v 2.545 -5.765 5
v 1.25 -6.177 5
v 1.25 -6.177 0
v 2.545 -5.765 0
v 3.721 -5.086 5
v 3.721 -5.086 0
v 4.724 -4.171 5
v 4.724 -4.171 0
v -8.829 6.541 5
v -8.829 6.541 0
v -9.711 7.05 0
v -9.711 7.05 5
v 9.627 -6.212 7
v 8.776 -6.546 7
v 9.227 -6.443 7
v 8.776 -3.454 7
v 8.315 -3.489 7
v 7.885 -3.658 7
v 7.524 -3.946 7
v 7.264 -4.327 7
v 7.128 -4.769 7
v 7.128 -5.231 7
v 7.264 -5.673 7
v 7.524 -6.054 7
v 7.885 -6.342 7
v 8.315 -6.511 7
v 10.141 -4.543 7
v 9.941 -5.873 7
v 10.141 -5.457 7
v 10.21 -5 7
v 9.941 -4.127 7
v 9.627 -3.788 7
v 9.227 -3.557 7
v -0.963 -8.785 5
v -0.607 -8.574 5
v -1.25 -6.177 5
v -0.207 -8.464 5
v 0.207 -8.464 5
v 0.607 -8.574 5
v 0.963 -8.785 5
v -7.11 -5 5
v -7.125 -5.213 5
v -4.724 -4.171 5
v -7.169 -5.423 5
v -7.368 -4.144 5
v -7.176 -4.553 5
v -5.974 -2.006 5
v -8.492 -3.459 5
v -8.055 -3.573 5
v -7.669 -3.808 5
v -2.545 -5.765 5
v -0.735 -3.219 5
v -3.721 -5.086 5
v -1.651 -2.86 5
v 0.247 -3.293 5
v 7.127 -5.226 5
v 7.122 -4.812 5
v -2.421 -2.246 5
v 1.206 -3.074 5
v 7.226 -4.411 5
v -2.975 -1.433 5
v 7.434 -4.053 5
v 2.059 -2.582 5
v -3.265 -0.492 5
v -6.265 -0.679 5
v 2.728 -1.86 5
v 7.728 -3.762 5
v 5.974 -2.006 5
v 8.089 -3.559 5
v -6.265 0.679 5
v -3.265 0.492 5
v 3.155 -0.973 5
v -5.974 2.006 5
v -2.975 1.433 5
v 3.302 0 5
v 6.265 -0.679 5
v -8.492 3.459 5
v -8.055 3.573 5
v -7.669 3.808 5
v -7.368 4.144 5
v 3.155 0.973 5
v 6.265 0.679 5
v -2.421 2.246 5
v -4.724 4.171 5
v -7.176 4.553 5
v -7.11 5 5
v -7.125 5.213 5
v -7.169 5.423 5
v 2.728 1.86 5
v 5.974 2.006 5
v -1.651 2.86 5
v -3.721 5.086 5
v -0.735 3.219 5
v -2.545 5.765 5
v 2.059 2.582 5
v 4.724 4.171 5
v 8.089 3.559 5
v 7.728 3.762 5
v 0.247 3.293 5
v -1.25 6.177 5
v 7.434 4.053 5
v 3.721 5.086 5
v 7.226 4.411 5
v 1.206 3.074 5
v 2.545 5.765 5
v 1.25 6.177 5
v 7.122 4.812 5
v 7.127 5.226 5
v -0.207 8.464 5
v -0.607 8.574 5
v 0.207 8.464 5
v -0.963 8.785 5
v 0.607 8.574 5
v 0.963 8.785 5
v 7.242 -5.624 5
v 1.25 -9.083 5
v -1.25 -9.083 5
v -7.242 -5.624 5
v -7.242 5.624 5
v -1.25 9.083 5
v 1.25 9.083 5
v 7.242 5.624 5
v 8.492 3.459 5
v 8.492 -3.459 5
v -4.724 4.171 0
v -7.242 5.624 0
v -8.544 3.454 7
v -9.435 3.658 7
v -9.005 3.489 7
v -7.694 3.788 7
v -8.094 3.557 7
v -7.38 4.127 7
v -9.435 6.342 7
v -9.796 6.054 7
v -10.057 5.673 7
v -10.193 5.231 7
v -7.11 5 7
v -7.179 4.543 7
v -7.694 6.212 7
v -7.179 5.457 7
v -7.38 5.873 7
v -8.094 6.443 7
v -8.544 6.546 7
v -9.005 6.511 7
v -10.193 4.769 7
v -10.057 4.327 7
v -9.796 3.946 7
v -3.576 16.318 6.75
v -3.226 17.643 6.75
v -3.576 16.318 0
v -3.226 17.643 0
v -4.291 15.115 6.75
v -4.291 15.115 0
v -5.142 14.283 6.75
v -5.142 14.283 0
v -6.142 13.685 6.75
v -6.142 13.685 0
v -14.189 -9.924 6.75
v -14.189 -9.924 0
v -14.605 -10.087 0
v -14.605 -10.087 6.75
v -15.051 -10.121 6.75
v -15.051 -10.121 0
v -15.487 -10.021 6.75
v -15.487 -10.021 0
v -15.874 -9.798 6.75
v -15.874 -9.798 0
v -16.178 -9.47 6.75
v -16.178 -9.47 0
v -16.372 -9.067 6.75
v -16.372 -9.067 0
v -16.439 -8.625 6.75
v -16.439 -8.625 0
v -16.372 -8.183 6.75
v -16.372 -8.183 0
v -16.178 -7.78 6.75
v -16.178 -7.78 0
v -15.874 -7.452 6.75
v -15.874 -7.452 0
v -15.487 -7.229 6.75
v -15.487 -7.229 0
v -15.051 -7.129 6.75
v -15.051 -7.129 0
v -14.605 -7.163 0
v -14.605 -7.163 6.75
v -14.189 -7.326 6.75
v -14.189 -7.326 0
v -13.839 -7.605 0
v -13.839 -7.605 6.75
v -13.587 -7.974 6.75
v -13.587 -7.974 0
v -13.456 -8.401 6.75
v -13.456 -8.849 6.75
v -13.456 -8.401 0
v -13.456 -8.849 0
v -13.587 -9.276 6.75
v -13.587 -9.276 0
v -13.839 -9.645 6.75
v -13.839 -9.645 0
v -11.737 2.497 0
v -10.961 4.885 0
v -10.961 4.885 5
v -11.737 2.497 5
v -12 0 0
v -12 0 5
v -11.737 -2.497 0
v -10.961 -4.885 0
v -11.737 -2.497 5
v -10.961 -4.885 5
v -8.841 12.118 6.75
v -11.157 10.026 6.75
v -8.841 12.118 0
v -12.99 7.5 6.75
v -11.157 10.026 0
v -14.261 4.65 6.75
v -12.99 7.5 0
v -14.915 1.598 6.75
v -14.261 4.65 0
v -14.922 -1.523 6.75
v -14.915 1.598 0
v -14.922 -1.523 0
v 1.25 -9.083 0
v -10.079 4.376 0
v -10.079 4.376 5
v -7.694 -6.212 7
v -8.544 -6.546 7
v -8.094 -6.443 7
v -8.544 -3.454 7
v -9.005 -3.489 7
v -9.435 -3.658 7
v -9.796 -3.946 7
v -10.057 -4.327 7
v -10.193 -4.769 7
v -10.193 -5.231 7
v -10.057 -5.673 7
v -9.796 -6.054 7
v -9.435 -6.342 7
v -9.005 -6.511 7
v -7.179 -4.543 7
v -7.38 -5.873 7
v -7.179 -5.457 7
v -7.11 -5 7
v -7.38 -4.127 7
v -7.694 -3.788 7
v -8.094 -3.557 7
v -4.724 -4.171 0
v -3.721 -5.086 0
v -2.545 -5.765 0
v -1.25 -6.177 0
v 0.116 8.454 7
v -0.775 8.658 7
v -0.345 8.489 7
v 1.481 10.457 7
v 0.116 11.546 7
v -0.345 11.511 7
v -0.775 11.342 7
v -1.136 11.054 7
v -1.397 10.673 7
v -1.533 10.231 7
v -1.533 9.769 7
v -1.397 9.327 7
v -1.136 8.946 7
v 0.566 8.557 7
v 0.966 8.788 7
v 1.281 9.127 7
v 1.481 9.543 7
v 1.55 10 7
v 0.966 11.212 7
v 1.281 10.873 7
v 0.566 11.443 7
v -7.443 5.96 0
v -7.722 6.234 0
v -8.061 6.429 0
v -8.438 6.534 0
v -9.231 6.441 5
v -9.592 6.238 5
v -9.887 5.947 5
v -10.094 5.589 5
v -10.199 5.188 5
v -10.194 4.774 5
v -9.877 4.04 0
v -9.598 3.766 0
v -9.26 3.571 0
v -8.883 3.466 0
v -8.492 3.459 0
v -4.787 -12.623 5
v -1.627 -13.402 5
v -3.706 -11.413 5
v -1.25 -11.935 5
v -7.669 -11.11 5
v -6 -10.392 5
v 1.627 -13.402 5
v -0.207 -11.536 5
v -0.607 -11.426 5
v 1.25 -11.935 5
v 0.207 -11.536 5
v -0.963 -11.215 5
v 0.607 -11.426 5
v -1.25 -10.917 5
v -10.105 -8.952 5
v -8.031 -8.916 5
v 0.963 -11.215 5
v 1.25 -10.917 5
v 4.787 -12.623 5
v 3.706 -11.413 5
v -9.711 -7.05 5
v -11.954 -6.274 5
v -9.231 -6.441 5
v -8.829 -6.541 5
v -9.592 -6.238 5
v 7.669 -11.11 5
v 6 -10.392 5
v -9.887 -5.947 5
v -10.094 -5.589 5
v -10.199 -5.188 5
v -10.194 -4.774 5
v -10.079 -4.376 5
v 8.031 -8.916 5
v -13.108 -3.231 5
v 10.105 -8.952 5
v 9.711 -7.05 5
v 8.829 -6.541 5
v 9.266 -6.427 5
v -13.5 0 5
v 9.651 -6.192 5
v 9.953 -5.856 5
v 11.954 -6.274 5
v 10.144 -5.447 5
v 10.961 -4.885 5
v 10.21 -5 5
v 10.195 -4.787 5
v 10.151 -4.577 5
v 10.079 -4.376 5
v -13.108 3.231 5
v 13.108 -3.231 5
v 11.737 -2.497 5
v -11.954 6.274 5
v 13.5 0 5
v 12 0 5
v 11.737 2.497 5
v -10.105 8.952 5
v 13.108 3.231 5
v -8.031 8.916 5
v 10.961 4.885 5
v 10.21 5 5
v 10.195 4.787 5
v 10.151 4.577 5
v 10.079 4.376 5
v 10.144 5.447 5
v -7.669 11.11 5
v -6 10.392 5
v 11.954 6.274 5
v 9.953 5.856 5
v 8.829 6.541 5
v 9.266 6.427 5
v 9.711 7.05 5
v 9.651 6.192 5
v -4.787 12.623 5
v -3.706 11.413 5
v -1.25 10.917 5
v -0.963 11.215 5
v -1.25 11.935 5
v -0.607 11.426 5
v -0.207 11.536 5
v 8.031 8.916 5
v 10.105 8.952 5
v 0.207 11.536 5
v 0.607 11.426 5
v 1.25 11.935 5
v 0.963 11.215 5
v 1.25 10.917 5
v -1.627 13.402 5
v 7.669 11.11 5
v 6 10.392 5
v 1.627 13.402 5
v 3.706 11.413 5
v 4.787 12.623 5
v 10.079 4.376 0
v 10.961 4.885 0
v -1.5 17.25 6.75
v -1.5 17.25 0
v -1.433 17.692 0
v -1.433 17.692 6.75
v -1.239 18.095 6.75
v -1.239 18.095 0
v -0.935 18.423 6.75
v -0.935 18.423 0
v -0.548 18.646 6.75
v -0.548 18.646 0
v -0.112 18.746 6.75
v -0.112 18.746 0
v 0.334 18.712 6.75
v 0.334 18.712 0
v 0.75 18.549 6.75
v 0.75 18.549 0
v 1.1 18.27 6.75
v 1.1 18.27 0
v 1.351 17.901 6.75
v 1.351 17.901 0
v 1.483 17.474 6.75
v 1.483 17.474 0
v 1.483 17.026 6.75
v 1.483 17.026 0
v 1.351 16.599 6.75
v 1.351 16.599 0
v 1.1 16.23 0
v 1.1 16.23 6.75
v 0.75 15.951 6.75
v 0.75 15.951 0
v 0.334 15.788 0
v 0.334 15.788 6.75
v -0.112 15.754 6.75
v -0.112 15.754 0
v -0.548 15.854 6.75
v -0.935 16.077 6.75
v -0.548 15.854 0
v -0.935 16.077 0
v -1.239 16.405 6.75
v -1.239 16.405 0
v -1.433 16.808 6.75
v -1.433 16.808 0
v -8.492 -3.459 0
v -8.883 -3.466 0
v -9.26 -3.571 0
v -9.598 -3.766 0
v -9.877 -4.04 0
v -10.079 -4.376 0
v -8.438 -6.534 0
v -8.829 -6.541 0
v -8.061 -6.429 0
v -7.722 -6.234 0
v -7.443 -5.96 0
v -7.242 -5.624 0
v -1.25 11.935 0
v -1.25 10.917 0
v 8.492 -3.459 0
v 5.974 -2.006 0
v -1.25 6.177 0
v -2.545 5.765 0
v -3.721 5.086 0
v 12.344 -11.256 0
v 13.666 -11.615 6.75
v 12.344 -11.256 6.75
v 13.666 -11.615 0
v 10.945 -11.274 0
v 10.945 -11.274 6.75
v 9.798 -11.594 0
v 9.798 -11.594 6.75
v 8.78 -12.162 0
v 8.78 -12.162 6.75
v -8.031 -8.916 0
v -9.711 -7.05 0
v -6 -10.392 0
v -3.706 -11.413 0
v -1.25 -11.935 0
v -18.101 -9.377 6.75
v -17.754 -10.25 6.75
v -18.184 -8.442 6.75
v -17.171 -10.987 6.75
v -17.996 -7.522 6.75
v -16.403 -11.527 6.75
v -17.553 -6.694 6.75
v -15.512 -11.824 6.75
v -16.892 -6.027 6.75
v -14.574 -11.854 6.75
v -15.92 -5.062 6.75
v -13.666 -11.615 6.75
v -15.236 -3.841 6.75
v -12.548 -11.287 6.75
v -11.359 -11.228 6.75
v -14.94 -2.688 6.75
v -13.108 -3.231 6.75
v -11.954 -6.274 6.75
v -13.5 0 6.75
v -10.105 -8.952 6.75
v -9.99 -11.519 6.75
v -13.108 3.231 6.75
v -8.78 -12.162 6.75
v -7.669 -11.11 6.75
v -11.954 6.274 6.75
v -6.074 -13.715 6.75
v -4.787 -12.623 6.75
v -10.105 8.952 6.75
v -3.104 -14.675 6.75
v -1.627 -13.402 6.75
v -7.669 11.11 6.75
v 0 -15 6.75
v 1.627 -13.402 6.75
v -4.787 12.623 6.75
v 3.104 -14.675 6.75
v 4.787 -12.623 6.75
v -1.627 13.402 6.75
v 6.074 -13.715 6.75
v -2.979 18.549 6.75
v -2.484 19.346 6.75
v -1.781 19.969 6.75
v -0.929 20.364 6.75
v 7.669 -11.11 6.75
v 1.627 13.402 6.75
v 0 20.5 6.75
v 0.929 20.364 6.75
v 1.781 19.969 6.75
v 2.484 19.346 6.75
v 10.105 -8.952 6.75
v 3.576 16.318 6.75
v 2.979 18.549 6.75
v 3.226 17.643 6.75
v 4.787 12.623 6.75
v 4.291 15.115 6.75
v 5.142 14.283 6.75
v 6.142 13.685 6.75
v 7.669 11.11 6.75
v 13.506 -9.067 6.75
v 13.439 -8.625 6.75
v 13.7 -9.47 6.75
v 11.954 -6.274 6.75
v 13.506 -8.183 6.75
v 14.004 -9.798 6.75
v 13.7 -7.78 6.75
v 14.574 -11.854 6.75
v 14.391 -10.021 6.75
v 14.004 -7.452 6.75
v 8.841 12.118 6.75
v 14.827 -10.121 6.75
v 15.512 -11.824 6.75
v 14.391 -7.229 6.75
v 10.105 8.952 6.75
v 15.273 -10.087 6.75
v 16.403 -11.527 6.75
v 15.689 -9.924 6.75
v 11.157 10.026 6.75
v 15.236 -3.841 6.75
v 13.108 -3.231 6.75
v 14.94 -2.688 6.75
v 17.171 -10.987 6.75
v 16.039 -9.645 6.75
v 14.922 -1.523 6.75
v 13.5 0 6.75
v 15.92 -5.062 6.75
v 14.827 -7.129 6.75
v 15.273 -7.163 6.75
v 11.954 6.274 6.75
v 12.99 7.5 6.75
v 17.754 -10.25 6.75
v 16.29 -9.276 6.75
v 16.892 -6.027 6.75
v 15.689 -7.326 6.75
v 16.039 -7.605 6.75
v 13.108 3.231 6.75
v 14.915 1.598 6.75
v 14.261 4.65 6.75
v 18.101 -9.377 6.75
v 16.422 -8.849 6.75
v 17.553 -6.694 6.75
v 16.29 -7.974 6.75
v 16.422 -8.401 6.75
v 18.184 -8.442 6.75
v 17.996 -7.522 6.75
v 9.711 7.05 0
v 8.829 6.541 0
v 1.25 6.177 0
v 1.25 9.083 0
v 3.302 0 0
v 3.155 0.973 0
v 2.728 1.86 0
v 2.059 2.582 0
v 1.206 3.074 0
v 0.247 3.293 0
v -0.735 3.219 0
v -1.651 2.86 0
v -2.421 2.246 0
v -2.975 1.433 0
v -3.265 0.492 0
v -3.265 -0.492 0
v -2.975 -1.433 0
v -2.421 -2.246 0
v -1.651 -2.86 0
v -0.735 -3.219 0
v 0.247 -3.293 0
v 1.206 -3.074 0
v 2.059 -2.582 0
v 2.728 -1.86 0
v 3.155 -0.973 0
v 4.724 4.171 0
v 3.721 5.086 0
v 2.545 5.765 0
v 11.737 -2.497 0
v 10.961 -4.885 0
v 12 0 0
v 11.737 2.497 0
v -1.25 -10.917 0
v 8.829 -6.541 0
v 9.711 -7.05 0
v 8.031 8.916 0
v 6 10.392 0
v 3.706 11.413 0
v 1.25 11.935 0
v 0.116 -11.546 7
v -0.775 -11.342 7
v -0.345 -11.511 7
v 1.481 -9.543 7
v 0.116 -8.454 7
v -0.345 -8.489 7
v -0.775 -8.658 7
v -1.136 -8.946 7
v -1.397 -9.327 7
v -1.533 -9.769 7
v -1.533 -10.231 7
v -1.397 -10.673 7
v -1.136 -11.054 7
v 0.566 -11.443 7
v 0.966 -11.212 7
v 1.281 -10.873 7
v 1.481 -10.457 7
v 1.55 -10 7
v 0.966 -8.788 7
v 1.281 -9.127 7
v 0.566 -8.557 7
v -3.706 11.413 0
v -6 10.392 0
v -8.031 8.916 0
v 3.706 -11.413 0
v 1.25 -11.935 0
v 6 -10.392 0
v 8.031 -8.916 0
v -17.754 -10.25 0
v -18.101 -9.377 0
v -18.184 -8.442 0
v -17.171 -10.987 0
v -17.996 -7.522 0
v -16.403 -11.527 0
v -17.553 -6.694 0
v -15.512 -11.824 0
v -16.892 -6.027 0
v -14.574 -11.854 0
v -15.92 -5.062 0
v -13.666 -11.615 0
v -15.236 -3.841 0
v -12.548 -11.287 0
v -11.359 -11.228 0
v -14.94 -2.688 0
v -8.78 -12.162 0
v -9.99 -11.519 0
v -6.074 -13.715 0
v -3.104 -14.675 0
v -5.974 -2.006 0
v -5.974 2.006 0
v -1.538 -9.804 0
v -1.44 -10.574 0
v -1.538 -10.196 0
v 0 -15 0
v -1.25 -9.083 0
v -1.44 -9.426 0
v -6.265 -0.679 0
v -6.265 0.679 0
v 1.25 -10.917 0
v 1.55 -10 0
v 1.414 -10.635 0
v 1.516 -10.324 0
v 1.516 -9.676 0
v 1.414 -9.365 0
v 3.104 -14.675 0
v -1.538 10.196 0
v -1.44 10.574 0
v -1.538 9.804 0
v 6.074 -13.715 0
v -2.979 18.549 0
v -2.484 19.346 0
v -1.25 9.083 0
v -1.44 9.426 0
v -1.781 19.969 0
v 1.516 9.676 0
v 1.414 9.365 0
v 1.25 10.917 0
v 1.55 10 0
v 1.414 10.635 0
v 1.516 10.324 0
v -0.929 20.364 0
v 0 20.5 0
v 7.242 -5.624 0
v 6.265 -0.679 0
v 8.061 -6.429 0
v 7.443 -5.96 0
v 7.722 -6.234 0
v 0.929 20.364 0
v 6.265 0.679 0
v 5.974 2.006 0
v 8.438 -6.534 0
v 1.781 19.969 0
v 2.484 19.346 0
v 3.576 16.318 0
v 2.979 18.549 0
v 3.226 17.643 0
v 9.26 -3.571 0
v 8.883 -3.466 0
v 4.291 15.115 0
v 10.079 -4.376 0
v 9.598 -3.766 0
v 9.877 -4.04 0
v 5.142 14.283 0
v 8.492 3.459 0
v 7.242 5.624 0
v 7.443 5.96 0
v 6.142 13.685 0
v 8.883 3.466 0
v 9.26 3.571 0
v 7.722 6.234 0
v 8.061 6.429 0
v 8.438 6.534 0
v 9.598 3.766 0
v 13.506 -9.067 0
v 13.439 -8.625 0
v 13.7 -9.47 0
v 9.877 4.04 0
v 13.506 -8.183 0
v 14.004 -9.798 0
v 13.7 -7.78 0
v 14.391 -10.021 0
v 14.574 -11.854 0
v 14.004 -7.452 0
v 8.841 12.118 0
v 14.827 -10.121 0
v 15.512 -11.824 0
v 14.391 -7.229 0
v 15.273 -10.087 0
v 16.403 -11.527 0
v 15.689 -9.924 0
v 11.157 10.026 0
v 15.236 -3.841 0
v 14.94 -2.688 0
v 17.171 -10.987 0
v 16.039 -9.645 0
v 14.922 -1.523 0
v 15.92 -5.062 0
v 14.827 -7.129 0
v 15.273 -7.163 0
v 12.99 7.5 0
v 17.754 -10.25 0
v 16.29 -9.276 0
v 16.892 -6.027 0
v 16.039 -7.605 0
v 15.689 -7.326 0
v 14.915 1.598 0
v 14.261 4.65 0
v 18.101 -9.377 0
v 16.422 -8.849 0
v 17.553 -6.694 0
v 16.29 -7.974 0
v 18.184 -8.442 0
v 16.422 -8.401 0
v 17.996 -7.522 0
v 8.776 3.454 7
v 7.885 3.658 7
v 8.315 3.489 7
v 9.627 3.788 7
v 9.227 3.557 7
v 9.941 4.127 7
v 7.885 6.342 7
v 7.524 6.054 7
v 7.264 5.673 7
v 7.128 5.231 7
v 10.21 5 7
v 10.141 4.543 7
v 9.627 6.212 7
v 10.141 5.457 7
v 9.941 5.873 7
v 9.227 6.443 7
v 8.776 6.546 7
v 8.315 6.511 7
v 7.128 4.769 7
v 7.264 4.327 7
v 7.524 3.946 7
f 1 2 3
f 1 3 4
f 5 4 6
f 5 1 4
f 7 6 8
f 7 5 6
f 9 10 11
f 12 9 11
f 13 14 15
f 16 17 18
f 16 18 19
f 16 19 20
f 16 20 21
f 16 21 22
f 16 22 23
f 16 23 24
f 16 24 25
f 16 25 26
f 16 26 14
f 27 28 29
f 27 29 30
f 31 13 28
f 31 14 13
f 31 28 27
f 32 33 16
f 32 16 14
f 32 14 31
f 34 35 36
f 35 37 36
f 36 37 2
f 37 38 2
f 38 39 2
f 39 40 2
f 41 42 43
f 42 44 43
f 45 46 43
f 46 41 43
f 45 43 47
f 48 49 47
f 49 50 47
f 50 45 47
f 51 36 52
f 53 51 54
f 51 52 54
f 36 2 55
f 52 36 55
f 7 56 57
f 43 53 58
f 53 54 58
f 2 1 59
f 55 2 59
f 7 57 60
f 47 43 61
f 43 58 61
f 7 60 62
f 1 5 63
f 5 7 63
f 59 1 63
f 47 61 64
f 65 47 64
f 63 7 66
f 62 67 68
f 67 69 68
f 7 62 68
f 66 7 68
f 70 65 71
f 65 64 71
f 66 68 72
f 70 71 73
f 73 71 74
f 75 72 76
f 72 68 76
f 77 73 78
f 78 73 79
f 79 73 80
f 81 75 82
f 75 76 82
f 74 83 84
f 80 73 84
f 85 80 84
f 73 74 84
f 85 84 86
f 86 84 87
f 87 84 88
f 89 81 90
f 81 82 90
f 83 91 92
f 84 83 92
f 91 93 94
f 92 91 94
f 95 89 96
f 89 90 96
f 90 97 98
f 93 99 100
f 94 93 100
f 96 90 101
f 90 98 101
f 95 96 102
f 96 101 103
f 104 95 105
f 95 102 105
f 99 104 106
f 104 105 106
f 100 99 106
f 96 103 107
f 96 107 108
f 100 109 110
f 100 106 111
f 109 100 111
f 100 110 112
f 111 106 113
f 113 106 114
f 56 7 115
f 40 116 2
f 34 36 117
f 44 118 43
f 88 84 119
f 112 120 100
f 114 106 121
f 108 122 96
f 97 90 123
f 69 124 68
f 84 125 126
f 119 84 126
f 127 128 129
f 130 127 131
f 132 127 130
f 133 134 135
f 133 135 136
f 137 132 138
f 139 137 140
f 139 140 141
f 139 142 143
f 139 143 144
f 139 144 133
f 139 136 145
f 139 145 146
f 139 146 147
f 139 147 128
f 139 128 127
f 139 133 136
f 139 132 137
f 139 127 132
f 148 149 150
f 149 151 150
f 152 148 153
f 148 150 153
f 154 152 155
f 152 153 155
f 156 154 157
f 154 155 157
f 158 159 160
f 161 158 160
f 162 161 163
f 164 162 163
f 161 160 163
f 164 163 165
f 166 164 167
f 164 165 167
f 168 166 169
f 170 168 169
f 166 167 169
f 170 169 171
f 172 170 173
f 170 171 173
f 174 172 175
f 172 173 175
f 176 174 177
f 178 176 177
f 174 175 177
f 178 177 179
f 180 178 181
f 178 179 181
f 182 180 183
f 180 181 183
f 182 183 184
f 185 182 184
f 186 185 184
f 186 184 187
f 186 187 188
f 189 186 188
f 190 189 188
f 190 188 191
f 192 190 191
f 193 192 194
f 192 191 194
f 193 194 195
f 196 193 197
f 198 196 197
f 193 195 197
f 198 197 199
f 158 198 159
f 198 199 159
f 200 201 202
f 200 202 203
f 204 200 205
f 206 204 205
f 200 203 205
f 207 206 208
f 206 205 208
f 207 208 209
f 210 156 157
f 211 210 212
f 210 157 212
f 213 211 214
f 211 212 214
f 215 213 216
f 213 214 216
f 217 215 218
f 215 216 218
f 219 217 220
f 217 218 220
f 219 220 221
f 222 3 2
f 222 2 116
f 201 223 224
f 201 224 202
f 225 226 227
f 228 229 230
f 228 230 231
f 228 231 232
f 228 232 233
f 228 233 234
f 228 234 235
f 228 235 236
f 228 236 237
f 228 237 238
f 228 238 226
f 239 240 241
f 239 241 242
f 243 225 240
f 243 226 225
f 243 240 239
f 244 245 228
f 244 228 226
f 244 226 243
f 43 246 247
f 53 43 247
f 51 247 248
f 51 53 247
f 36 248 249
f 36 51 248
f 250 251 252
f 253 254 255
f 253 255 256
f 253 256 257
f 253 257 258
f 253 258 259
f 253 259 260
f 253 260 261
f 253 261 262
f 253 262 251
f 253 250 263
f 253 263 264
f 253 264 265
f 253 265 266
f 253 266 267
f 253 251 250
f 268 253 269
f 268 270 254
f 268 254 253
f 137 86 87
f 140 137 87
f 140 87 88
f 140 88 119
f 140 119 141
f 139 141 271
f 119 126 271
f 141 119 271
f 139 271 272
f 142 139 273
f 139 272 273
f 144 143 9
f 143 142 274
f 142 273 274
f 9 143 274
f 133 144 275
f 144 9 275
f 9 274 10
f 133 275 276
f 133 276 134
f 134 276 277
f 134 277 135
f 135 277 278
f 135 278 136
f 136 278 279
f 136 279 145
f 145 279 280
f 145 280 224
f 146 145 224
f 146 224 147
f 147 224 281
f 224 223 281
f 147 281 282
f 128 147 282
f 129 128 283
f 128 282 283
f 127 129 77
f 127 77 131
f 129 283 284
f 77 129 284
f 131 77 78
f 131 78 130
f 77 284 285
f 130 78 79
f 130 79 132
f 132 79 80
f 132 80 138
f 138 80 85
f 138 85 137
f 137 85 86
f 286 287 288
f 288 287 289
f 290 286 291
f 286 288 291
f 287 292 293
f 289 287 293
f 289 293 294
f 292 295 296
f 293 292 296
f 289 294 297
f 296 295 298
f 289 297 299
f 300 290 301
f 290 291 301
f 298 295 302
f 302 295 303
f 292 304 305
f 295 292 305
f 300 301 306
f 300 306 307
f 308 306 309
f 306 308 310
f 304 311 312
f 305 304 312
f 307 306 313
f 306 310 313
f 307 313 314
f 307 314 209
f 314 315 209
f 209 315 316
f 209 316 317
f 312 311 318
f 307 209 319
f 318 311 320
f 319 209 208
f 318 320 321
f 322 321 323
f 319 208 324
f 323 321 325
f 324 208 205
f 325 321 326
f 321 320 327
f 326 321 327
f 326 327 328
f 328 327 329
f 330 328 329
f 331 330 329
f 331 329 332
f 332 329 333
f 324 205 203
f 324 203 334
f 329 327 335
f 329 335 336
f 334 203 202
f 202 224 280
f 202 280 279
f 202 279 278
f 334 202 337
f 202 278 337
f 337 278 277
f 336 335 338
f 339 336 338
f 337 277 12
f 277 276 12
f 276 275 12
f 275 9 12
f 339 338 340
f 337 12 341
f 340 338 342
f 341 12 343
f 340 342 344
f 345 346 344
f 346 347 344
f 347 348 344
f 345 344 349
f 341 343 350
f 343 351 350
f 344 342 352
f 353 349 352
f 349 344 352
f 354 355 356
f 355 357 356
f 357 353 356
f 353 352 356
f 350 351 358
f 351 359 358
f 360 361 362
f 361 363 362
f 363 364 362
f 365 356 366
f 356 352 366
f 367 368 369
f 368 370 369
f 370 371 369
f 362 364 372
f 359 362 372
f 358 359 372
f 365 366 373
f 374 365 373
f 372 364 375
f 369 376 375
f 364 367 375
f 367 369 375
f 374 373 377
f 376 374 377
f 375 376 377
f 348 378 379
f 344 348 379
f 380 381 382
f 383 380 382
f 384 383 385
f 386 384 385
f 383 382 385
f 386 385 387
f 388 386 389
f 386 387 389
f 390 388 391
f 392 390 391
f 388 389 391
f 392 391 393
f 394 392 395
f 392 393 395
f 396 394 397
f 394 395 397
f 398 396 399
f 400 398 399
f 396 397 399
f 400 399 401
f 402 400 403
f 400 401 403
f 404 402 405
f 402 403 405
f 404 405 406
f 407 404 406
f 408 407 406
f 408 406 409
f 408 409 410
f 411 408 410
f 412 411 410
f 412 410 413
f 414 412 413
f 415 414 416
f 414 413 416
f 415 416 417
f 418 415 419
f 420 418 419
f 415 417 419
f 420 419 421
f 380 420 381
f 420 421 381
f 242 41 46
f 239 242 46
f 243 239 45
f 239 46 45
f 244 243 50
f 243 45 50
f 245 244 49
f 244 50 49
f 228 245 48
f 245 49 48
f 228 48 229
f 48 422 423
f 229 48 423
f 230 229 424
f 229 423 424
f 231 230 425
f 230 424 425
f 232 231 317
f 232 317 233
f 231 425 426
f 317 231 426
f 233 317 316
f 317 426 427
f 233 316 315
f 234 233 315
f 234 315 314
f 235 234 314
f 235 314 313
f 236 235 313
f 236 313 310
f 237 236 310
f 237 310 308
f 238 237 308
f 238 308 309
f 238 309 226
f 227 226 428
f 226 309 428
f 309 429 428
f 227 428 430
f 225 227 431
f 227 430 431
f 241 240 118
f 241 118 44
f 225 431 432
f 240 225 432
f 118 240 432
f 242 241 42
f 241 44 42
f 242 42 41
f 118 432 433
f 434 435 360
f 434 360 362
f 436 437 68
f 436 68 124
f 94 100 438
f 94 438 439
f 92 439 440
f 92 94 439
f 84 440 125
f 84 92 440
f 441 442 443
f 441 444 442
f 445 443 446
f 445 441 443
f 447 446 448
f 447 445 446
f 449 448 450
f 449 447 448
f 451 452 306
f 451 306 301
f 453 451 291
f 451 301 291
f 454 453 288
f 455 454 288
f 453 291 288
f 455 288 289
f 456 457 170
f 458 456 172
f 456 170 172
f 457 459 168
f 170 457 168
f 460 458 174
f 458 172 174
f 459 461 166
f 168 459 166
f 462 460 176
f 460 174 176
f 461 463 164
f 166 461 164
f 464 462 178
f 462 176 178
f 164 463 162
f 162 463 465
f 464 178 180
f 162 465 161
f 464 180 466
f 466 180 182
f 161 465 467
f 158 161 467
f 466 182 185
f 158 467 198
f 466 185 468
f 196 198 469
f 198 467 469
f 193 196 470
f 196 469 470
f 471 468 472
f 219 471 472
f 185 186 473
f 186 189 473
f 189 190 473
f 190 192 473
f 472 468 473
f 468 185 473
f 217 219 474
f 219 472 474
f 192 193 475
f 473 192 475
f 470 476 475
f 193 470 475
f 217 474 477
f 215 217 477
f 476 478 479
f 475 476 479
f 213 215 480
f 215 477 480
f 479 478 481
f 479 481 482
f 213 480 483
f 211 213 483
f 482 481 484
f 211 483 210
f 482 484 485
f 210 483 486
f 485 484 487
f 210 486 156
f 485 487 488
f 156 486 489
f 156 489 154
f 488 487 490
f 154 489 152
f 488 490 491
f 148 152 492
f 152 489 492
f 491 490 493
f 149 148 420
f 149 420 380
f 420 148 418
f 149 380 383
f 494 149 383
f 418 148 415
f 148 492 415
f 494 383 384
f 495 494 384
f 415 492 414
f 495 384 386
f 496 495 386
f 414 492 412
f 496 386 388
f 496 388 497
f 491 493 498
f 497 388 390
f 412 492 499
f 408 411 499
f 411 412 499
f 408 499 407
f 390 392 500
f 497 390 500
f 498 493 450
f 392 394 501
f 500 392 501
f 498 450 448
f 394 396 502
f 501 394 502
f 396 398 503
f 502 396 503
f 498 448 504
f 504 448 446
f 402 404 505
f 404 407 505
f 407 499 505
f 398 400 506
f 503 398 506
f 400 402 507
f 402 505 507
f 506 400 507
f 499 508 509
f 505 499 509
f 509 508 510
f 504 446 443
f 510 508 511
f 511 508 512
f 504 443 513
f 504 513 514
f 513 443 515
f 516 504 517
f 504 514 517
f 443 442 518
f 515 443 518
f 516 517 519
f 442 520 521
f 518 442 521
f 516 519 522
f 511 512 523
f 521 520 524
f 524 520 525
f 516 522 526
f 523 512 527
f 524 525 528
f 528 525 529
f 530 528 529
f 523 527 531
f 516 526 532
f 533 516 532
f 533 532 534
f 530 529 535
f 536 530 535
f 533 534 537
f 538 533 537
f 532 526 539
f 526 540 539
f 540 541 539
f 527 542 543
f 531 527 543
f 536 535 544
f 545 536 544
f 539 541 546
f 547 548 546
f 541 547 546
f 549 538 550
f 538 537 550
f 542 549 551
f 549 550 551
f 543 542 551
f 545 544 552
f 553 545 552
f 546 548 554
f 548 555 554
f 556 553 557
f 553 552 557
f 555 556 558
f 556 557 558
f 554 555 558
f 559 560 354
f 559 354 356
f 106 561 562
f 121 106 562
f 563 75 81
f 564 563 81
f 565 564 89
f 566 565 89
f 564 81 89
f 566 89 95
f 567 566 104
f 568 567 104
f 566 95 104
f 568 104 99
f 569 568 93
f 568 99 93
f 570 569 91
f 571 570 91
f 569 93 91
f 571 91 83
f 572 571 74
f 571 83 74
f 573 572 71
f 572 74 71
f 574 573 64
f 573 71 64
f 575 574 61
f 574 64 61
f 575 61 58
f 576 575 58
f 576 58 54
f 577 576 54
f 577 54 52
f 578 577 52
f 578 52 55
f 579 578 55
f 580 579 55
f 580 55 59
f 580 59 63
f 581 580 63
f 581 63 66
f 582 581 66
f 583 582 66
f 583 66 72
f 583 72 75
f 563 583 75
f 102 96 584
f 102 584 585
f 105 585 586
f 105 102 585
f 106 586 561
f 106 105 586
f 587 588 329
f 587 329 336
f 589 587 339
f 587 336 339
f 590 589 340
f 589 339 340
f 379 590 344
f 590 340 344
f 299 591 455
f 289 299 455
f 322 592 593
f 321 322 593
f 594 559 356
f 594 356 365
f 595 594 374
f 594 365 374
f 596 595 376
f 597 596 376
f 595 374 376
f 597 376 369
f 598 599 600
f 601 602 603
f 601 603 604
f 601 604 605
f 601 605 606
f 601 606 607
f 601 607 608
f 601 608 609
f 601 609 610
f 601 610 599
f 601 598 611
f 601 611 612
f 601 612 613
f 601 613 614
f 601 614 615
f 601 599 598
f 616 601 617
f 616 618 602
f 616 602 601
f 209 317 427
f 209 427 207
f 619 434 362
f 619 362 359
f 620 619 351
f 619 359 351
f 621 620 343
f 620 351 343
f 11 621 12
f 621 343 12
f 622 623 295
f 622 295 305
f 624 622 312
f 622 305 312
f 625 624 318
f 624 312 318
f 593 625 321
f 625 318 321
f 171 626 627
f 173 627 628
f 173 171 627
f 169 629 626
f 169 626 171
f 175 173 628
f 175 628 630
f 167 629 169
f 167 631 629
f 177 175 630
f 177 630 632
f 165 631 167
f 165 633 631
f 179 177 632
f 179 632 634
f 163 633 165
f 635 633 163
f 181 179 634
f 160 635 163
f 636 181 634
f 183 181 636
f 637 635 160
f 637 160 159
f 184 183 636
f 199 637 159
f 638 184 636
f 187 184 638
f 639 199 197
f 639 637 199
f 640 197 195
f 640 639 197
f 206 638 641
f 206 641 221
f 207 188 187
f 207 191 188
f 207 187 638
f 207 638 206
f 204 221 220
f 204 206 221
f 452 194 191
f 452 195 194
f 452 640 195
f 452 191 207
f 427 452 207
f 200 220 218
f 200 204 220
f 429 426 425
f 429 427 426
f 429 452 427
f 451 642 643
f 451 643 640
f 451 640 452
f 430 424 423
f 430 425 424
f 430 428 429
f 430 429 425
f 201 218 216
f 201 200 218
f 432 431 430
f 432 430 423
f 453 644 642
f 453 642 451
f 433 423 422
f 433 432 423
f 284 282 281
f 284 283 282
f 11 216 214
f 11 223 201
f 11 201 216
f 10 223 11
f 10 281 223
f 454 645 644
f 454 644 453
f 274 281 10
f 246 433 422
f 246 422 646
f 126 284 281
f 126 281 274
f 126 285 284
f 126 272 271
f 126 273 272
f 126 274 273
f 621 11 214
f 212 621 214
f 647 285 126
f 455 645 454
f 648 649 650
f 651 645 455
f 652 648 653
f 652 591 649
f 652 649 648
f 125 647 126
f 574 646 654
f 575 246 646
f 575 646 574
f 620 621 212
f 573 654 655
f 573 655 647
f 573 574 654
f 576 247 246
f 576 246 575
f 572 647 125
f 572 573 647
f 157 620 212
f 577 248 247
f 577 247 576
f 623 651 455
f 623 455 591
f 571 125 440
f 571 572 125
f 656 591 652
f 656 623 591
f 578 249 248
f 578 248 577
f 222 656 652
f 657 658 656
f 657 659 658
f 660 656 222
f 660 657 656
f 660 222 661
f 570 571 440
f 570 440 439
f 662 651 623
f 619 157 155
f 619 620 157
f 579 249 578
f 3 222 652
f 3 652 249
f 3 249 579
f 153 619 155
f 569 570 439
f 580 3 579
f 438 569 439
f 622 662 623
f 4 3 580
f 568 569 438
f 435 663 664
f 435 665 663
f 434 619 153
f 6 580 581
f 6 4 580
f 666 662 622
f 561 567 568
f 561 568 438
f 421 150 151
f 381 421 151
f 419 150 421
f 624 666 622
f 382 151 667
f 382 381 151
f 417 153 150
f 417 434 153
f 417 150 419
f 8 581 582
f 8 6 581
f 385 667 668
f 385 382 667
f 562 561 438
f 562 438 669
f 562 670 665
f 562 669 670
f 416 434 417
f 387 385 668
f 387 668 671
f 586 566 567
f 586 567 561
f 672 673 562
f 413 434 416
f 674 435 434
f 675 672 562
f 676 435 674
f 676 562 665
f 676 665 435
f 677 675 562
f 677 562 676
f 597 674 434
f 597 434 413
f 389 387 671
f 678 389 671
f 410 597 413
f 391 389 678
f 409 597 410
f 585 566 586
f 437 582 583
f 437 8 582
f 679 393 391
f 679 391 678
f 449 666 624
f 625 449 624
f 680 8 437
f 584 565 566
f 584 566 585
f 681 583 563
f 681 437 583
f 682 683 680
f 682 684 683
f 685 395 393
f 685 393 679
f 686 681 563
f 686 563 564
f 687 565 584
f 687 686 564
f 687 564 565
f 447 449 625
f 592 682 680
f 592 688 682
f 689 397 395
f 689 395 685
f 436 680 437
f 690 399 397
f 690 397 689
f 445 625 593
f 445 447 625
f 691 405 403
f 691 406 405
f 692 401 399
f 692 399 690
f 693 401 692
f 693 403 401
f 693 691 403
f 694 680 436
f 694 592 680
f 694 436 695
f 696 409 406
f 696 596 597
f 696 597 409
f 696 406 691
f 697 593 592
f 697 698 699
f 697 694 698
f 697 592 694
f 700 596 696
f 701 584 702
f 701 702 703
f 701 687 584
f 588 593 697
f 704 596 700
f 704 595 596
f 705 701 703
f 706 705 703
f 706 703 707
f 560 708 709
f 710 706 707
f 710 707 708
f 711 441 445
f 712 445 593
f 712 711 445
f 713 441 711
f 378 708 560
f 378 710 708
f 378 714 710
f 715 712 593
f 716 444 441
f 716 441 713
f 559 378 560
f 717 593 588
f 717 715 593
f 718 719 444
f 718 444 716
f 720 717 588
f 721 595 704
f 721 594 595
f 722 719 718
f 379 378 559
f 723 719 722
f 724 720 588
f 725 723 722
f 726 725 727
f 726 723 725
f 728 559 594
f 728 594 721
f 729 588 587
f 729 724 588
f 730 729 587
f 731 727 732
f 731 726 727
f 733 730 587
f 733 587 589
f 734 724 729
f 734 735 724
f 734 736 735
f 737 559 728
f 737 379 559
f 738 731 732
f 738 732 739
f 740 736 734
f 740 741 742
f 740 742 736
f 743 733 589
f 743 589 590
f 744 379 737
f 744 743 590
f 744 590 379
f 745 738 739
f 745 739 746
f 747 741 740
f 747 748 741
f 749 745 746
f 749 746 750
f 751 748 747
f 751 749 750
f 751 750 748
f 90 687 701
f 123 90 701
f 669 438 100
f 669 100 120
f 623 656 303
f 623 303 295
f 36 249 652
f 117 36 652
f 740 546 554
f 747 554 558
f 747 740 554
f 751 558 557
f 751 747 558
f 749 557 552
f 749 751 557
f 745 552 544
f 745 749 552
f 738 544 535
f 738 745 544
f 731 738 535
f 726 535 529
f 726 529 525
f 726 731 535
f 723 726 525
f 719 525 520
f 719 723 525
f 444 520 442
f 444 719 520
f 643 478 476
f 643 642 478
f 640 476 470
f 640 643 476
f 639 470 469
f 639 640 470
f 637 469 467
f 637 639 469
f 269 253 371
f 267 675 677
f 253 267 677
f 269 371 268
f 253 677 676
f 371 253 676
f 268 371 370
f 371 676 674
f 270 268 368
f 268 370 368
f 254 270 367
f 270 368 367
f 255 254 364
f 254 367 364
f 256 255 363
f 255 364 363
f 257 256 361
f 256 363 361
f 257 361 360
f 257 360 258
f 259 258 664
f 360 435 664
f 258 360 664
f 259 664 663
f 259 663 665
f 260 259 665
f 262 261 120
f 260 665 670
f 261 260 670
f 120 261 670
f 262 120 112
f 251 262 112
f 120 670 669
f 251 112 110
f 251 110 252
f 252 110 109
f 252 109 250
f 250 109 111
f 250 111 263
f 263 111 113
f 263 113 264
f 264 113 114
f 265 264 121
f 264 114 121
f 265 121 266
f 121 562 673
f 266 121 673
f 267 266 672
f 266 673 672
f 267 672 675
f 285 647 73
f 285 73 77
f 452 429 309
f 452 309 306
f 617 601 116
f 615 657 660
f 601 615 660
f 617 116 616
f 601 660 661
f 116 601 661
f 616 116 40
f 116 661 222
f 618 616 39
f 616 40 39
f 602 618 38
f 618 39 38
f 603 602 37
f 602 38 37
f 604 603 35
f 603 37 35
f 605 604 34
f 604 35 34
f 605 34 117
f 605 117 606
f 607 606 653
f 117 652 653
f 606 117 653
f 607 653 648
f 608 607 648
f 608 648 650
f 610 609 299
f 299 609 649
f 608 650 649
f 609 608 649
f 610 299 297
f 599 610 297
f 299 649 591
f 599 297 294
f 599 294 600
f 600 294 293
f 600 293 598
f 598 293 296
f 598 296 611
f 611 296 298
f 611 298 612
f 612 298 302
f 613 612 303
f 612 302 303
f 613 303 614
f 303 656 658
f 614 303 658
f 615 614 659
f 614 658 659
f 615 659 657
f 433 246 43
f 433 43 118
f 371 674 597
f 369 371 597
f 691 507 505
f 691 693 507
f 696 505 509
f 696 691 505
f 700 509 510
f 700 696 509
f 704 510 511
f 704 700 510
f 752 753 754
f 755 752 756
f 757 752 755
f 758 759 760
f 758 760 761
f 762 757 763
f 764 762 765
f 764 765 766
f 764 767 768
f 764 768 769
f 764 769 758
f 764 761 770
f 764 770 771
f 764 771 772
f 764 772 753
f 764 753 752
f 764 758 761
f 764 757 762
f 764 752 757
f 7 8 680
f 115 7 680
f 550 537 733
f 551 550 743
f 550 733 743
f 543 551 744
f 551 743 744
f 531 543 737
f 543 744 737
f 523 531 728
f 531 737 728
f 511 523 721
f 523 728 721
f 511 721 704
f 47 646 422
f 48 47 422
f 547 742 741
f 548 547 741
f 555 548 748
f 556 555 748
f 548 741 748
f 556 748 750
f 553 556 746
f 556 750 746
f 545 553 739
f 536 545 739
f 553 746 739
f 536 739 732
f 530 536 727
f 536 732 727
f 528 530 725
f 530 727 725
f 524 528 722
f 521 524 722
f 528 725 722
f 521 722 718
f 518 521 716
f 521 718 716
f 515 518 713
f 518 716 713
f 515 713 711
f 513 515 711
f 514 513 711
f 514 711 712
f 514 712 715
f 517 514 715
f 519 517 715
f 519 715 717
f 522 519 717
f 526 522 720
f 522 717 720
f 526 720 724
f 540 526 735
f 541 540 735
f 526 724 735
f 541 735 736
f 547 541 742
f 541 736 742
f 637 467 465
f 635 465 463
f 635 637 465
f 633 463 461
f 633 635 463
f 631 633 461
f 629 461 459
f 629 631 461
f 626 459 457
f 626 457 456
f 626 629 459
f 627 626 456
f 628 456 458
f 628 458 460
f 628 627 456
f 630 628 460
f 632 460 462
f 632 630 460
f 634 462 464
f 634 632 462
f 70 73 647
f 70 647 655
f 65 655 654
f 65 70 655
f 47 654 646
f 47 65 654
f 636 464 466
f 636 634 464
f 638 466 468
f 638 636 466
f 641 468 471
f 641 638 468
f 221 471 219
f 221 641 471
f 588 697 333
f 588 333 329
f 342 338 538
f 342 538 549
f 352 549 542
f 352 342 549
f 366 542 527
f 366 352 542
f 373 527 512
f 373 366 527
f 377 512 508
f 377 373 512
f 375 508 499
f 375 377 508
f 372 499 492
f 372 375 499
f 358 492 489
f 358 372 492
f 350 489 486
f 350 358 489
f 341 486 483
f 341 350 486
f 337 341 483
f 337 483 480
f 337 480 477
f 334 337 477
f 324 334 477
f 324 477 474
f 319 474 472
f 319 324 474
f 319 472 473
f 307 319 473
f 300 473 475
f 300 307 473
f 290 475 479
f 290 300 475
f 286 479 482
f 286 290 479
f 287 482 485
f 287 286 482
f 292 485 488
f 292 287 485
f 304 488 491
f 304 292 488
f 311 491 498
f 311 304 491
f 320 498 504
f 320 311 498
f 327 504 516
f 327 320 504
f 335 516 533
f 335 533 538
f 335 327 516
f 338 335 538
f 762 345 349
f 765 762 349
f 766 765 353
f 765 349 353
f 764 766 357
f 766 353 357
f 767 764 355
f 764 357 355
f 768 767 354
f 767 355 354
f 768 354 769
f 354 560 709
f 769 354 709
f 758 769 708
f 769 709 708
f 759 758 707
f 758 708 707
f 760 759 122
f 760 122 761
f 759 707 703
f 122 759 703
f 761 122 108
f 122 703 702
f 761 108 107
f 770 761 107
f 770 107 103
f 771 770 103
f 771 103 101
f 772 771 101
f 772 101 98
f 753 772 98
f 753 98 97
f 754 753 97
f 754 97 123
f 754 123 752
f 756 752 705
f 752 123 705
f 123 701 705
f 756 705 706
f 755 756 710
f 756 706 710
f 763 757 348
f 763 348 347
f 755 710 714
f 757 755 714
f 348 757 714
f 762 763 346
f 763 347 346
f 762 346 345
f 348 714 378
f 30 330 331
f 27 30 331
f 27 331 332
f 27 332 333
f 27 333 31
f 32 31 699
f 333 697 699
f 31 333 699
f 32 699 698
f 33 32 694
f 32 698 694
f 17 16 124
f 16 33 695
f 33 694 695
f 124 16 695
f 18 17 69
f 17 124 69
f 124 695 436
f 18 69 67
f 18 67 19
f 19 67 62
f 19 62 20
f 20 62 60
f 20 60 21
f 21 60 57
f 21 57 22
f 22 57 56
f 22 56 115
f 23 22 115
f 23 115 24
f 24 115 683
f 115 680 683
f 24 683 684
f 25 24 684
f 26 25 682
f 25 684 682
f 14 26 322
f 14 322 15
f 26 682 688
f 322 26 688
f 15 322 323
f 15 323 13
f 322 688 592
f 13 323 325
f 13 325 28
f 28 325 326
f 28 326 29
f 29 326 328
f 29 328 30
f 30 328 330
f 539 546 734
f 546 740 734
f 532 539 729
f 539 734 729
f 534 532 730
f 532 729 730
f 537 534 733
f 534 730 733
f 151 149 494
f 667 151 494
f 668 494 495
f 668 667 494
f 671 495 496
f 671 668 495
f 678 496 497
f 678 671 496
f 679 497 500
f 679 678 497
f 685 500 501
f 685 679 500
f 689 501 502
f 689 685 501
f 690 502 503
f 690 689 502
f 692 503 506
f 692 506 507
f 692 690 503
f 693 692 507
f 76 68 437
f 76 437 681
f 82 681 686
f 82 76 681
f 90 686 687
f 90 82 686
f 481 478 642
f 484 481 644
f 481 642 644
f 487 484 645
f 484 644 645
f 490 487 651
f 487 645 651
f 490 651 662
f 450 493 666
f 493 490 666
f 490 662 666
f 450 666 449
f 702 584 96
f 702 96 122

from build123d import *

# Parameters (mm, degrees)
SKETCH1_R                = 15
BOSS_EXTRUDE1_DEPTH      = 5
SKETCH2_R                = 12
SKETCH2_R_2              = 6.302
SKETCH2_R_3              = 3.302
CUT_EXTRUDE1_DEPTH       = 22.794494718
SKETCH4_R                = 1.55
BOSS_EXTRUDE2_DEPTH      = 7
BOSS_EXTRUDE2_2_DEPTH    = 7
BOSS_EXTRUDE2_3_DEPTH    = 7
BOSS_EXTRUDE2_4_DEPTH    = 7
BOSS_EXTRUDE2_5_DEPTH    = 7
BOSS_EXTRUDE2_6_DEPTH    = 7
SKETCH5_W                = 2.5
SKETCH5_H                = 8.771038414
BOSS_EXTRUDE3_DEPTH      = 5
CIRPATTERN1_COUNT        = 6
SKETCH6_R                = 15
SKETCH6_R_2              = 13.5
BOSS_EXTRUDE4_DEPTH      = 1.75
SKETCH7_R                = 3.25
SKETCH7_R_2              = 1.5
BOSS_EXTRUDE5_DEPTH      = 6.75
FILLET2_R                = 5
CIRPATTERN2_COUNT        = 3
FILLET2_OF_CIRPATTERN2_R = 5


with BuildPart() as part:
    # Sketch1 → Boss-Extrude1 (new body)
    with BuildSketch(Plane.XY):
        Circle(SKETCH1_R)
    extrude(amount=BOSS_EXTRUDE1_DEPTH)

    # Sketch2 → Cut-Extrude1 (cut, through all)
    with BuildSketch(Plane.XY.offset(5)):
        Circle(SKETCH2_R)
        Circle(SKETCH2_R_2, mode=Mode.SUBTRACT)
        Circle(SKETCH2_R_3)
    extrude(amount=-CUT_EXTRUDE1_DEPTH, mode=Mode.SUBTRACT)


with BuildPart() as cut_extrude1_piece_1:
    # of the separate pieces the step leaves, piece 1, a body of its own (cut_extrude1_pieces)
    add(part.part.solids().sort_by_distance((15, 0, 0))[0])



with BuildPart() as cut_extrude1_piece_2:
    # of the separate pieces the step leaves, piece 2, a body of its own (cut_extrude1_pieces)
    add(part.part.solids().sort_by_distance((6.302, 0, 0))[0])


with BuildPart() as body_3:
    # Sketch4 → Boss-Extrude2 (new body)
    with BuildSketch(Plane.XY):
        with Locations((0, 10)):
            Circle(SKETCH4_R)
    extrude(amount=BOSS_EXTRUDE2_DEPTH)


with BuildPart() as body_4:
    # Sketch4 → Boss-Extrude2 2 (new body)
    with BuildSketch(Plane.XY):
        with Locations((-8.660254038, 5)):
            Circle(SKETCH4_R)
    extrude(amount=BOSS_EXTRUDE2_2_DEPTH)


with BuildPart() as body_5:
    # Sketch4 → Boss-Extrude2 3 (new body)
    with BuildSketch(Plane.XY):
        with Locations((-8.660254038, -5)):
            Circle(SKETCH4_R)
    extrude(amount=BOSS_EXTRUDE2_3_DEPTH)


with BuildPart() as body_6:
    # Sketch4 → Boss-Extrude2 4 (new body)
    with BuildSketch(Plane.XY):
        with Locations((0, -10)):
            Circle(SKETCH4_R)
    extrude(amount=BOSS_EXTRUDE2_4_DEPTH)


with BuildPart() as body_7:
    # Sketch4 → Boss-Extrude2 5 (new body)
    with BuildSketch(Plane.XY):
        with Locations((8.660254038, -5)):
            Circle(SKETCH4_R)
    extrude(amount=BOSS_EXTRUDE2_5_DEPTH)


with BuildPart() as body_8:
    # Sketch4 → Boss-Extrude2 6 (new body)
    with BuildSketch(Plane.XY):
        with Locations((8.660254038, 5)):
            Circle(SKETCH4_R)
    extrude(amount=BOSS_EXTRUDE2_6_DEPTH)



with BuildPart() as cut_extrude1_piece_1_1:
    add(cut_extrude1_piece_1.part)

    add(cut_extrude1_piece_2.part)  # Boss-Extrude3 merges Cut-Extrude1 piece 2
    # Sketch5 → Boss-Extrude3 (add)
    with BuildSketch(Plane(origin=(0, 0, 0), x_dir=(-1, 0, 0), z_dir=(0, 0, -1))):
        with Locations((0, 10.562306722)):
            Rectangle(SKETCH5_W, SKETCH5_H)
    boss_extrude3 = extrude(amount=-BOSS_EXTRUDE3_DEPTH)

    # CirPattern1: Boss-Extrude3 ×6 about axis
    cirpattern1_axis = Axis((0, 0, 0), (0, 0, 1))
    for i in range(1, CIRPATTERN1_COUNT):
        add(boss_extrude3.rotate(cirpattern1_axis, i * 360 / CIRPATTERN1_COUNT))


with BuildPart() as body_8_1:
    add(body_8.part)

    add(cut_extrude1_piece_1_1.part)  # Boss-Extrude4 merges Cut-Extrude1 piece 1

    add(body_3.part)  # Boss-Extrude4 merges body 3

    add(body_4.part)  # Boss-Extrude4 merges body 4

    add(body_5.part)  # Boss-Extrude4 merges body 5

    add(body_6.part)  # Boss-Extrude4 merges body 6

    add(body_7.part)  # Boss-Extrude4 merges body 7
    # Sketch6 → Boss-Extrude4 (add)
    with BuildSketch(Plane.XY.offset(5)):
        Circle(SKETCH6_R)
        Circle(SKETCH6_R_2, mode=Mode.SUBTRACT)
    extrude(amount=BOSS_EXTRUDE4_DEPTH)

    # Sketch7 → Boss-Extrude5 (add)
    with BuildSketch(Plane(origin=(0, 0, 0), x_dir=(-1, 0, 0), z_dir=(0, 0, -1))):
        with Locations((0, 17.25)):
            Circle(SKETCH7_R)
        with Locations((0, 17.25)):
            Circle(SKETCH7_R_2, mode=Mode.SUBTRACT)
    boss_extrude5 = extrude(amount=-BOSS_EXTRUDE5_DEPTH)

    # Fillet2
    fillet2_edges = [body_8_1.edges().sort_by_distance(p)[0] for p in [
        (2.181099234, 14.84057971, 3.375),
        (-2.181099234, 14.84057971, 3.375),
    ]]
    fillet(fillet2_edges, radius=FILLET2_R)

    # CirPattern2: Boss-Extrude5 ×3 about axis
    cirpattern2_axis = Axis((0, 0, 0), (0, 0, 1))
    for i in range(1, CIRPATTERN2_COUNT):
        add(boss_extrude5.rotate(cirpattern2_axis, i * 360 / CIRPATTERN2_COUNT))

    # Fillet2 of CirPattern2
    fillet2_of_cirpattern2_edges = [body_8_1.edges().sort_by_distance(p)[0] for p in [
        (-13.942868653, -5.531402511, 3.375),
        (-11.761769419, -9.3091772, 3.375),
        (11.761769419, -9.3091772, 3.375),
        (13.942868653, -5.531402511, 3.375),
    ]]
    fillet(fillet2_of_cirpattern2_edges, radius=FILLET2_OF_CIRPATTERN2_R)


solid = body_8_1.part
